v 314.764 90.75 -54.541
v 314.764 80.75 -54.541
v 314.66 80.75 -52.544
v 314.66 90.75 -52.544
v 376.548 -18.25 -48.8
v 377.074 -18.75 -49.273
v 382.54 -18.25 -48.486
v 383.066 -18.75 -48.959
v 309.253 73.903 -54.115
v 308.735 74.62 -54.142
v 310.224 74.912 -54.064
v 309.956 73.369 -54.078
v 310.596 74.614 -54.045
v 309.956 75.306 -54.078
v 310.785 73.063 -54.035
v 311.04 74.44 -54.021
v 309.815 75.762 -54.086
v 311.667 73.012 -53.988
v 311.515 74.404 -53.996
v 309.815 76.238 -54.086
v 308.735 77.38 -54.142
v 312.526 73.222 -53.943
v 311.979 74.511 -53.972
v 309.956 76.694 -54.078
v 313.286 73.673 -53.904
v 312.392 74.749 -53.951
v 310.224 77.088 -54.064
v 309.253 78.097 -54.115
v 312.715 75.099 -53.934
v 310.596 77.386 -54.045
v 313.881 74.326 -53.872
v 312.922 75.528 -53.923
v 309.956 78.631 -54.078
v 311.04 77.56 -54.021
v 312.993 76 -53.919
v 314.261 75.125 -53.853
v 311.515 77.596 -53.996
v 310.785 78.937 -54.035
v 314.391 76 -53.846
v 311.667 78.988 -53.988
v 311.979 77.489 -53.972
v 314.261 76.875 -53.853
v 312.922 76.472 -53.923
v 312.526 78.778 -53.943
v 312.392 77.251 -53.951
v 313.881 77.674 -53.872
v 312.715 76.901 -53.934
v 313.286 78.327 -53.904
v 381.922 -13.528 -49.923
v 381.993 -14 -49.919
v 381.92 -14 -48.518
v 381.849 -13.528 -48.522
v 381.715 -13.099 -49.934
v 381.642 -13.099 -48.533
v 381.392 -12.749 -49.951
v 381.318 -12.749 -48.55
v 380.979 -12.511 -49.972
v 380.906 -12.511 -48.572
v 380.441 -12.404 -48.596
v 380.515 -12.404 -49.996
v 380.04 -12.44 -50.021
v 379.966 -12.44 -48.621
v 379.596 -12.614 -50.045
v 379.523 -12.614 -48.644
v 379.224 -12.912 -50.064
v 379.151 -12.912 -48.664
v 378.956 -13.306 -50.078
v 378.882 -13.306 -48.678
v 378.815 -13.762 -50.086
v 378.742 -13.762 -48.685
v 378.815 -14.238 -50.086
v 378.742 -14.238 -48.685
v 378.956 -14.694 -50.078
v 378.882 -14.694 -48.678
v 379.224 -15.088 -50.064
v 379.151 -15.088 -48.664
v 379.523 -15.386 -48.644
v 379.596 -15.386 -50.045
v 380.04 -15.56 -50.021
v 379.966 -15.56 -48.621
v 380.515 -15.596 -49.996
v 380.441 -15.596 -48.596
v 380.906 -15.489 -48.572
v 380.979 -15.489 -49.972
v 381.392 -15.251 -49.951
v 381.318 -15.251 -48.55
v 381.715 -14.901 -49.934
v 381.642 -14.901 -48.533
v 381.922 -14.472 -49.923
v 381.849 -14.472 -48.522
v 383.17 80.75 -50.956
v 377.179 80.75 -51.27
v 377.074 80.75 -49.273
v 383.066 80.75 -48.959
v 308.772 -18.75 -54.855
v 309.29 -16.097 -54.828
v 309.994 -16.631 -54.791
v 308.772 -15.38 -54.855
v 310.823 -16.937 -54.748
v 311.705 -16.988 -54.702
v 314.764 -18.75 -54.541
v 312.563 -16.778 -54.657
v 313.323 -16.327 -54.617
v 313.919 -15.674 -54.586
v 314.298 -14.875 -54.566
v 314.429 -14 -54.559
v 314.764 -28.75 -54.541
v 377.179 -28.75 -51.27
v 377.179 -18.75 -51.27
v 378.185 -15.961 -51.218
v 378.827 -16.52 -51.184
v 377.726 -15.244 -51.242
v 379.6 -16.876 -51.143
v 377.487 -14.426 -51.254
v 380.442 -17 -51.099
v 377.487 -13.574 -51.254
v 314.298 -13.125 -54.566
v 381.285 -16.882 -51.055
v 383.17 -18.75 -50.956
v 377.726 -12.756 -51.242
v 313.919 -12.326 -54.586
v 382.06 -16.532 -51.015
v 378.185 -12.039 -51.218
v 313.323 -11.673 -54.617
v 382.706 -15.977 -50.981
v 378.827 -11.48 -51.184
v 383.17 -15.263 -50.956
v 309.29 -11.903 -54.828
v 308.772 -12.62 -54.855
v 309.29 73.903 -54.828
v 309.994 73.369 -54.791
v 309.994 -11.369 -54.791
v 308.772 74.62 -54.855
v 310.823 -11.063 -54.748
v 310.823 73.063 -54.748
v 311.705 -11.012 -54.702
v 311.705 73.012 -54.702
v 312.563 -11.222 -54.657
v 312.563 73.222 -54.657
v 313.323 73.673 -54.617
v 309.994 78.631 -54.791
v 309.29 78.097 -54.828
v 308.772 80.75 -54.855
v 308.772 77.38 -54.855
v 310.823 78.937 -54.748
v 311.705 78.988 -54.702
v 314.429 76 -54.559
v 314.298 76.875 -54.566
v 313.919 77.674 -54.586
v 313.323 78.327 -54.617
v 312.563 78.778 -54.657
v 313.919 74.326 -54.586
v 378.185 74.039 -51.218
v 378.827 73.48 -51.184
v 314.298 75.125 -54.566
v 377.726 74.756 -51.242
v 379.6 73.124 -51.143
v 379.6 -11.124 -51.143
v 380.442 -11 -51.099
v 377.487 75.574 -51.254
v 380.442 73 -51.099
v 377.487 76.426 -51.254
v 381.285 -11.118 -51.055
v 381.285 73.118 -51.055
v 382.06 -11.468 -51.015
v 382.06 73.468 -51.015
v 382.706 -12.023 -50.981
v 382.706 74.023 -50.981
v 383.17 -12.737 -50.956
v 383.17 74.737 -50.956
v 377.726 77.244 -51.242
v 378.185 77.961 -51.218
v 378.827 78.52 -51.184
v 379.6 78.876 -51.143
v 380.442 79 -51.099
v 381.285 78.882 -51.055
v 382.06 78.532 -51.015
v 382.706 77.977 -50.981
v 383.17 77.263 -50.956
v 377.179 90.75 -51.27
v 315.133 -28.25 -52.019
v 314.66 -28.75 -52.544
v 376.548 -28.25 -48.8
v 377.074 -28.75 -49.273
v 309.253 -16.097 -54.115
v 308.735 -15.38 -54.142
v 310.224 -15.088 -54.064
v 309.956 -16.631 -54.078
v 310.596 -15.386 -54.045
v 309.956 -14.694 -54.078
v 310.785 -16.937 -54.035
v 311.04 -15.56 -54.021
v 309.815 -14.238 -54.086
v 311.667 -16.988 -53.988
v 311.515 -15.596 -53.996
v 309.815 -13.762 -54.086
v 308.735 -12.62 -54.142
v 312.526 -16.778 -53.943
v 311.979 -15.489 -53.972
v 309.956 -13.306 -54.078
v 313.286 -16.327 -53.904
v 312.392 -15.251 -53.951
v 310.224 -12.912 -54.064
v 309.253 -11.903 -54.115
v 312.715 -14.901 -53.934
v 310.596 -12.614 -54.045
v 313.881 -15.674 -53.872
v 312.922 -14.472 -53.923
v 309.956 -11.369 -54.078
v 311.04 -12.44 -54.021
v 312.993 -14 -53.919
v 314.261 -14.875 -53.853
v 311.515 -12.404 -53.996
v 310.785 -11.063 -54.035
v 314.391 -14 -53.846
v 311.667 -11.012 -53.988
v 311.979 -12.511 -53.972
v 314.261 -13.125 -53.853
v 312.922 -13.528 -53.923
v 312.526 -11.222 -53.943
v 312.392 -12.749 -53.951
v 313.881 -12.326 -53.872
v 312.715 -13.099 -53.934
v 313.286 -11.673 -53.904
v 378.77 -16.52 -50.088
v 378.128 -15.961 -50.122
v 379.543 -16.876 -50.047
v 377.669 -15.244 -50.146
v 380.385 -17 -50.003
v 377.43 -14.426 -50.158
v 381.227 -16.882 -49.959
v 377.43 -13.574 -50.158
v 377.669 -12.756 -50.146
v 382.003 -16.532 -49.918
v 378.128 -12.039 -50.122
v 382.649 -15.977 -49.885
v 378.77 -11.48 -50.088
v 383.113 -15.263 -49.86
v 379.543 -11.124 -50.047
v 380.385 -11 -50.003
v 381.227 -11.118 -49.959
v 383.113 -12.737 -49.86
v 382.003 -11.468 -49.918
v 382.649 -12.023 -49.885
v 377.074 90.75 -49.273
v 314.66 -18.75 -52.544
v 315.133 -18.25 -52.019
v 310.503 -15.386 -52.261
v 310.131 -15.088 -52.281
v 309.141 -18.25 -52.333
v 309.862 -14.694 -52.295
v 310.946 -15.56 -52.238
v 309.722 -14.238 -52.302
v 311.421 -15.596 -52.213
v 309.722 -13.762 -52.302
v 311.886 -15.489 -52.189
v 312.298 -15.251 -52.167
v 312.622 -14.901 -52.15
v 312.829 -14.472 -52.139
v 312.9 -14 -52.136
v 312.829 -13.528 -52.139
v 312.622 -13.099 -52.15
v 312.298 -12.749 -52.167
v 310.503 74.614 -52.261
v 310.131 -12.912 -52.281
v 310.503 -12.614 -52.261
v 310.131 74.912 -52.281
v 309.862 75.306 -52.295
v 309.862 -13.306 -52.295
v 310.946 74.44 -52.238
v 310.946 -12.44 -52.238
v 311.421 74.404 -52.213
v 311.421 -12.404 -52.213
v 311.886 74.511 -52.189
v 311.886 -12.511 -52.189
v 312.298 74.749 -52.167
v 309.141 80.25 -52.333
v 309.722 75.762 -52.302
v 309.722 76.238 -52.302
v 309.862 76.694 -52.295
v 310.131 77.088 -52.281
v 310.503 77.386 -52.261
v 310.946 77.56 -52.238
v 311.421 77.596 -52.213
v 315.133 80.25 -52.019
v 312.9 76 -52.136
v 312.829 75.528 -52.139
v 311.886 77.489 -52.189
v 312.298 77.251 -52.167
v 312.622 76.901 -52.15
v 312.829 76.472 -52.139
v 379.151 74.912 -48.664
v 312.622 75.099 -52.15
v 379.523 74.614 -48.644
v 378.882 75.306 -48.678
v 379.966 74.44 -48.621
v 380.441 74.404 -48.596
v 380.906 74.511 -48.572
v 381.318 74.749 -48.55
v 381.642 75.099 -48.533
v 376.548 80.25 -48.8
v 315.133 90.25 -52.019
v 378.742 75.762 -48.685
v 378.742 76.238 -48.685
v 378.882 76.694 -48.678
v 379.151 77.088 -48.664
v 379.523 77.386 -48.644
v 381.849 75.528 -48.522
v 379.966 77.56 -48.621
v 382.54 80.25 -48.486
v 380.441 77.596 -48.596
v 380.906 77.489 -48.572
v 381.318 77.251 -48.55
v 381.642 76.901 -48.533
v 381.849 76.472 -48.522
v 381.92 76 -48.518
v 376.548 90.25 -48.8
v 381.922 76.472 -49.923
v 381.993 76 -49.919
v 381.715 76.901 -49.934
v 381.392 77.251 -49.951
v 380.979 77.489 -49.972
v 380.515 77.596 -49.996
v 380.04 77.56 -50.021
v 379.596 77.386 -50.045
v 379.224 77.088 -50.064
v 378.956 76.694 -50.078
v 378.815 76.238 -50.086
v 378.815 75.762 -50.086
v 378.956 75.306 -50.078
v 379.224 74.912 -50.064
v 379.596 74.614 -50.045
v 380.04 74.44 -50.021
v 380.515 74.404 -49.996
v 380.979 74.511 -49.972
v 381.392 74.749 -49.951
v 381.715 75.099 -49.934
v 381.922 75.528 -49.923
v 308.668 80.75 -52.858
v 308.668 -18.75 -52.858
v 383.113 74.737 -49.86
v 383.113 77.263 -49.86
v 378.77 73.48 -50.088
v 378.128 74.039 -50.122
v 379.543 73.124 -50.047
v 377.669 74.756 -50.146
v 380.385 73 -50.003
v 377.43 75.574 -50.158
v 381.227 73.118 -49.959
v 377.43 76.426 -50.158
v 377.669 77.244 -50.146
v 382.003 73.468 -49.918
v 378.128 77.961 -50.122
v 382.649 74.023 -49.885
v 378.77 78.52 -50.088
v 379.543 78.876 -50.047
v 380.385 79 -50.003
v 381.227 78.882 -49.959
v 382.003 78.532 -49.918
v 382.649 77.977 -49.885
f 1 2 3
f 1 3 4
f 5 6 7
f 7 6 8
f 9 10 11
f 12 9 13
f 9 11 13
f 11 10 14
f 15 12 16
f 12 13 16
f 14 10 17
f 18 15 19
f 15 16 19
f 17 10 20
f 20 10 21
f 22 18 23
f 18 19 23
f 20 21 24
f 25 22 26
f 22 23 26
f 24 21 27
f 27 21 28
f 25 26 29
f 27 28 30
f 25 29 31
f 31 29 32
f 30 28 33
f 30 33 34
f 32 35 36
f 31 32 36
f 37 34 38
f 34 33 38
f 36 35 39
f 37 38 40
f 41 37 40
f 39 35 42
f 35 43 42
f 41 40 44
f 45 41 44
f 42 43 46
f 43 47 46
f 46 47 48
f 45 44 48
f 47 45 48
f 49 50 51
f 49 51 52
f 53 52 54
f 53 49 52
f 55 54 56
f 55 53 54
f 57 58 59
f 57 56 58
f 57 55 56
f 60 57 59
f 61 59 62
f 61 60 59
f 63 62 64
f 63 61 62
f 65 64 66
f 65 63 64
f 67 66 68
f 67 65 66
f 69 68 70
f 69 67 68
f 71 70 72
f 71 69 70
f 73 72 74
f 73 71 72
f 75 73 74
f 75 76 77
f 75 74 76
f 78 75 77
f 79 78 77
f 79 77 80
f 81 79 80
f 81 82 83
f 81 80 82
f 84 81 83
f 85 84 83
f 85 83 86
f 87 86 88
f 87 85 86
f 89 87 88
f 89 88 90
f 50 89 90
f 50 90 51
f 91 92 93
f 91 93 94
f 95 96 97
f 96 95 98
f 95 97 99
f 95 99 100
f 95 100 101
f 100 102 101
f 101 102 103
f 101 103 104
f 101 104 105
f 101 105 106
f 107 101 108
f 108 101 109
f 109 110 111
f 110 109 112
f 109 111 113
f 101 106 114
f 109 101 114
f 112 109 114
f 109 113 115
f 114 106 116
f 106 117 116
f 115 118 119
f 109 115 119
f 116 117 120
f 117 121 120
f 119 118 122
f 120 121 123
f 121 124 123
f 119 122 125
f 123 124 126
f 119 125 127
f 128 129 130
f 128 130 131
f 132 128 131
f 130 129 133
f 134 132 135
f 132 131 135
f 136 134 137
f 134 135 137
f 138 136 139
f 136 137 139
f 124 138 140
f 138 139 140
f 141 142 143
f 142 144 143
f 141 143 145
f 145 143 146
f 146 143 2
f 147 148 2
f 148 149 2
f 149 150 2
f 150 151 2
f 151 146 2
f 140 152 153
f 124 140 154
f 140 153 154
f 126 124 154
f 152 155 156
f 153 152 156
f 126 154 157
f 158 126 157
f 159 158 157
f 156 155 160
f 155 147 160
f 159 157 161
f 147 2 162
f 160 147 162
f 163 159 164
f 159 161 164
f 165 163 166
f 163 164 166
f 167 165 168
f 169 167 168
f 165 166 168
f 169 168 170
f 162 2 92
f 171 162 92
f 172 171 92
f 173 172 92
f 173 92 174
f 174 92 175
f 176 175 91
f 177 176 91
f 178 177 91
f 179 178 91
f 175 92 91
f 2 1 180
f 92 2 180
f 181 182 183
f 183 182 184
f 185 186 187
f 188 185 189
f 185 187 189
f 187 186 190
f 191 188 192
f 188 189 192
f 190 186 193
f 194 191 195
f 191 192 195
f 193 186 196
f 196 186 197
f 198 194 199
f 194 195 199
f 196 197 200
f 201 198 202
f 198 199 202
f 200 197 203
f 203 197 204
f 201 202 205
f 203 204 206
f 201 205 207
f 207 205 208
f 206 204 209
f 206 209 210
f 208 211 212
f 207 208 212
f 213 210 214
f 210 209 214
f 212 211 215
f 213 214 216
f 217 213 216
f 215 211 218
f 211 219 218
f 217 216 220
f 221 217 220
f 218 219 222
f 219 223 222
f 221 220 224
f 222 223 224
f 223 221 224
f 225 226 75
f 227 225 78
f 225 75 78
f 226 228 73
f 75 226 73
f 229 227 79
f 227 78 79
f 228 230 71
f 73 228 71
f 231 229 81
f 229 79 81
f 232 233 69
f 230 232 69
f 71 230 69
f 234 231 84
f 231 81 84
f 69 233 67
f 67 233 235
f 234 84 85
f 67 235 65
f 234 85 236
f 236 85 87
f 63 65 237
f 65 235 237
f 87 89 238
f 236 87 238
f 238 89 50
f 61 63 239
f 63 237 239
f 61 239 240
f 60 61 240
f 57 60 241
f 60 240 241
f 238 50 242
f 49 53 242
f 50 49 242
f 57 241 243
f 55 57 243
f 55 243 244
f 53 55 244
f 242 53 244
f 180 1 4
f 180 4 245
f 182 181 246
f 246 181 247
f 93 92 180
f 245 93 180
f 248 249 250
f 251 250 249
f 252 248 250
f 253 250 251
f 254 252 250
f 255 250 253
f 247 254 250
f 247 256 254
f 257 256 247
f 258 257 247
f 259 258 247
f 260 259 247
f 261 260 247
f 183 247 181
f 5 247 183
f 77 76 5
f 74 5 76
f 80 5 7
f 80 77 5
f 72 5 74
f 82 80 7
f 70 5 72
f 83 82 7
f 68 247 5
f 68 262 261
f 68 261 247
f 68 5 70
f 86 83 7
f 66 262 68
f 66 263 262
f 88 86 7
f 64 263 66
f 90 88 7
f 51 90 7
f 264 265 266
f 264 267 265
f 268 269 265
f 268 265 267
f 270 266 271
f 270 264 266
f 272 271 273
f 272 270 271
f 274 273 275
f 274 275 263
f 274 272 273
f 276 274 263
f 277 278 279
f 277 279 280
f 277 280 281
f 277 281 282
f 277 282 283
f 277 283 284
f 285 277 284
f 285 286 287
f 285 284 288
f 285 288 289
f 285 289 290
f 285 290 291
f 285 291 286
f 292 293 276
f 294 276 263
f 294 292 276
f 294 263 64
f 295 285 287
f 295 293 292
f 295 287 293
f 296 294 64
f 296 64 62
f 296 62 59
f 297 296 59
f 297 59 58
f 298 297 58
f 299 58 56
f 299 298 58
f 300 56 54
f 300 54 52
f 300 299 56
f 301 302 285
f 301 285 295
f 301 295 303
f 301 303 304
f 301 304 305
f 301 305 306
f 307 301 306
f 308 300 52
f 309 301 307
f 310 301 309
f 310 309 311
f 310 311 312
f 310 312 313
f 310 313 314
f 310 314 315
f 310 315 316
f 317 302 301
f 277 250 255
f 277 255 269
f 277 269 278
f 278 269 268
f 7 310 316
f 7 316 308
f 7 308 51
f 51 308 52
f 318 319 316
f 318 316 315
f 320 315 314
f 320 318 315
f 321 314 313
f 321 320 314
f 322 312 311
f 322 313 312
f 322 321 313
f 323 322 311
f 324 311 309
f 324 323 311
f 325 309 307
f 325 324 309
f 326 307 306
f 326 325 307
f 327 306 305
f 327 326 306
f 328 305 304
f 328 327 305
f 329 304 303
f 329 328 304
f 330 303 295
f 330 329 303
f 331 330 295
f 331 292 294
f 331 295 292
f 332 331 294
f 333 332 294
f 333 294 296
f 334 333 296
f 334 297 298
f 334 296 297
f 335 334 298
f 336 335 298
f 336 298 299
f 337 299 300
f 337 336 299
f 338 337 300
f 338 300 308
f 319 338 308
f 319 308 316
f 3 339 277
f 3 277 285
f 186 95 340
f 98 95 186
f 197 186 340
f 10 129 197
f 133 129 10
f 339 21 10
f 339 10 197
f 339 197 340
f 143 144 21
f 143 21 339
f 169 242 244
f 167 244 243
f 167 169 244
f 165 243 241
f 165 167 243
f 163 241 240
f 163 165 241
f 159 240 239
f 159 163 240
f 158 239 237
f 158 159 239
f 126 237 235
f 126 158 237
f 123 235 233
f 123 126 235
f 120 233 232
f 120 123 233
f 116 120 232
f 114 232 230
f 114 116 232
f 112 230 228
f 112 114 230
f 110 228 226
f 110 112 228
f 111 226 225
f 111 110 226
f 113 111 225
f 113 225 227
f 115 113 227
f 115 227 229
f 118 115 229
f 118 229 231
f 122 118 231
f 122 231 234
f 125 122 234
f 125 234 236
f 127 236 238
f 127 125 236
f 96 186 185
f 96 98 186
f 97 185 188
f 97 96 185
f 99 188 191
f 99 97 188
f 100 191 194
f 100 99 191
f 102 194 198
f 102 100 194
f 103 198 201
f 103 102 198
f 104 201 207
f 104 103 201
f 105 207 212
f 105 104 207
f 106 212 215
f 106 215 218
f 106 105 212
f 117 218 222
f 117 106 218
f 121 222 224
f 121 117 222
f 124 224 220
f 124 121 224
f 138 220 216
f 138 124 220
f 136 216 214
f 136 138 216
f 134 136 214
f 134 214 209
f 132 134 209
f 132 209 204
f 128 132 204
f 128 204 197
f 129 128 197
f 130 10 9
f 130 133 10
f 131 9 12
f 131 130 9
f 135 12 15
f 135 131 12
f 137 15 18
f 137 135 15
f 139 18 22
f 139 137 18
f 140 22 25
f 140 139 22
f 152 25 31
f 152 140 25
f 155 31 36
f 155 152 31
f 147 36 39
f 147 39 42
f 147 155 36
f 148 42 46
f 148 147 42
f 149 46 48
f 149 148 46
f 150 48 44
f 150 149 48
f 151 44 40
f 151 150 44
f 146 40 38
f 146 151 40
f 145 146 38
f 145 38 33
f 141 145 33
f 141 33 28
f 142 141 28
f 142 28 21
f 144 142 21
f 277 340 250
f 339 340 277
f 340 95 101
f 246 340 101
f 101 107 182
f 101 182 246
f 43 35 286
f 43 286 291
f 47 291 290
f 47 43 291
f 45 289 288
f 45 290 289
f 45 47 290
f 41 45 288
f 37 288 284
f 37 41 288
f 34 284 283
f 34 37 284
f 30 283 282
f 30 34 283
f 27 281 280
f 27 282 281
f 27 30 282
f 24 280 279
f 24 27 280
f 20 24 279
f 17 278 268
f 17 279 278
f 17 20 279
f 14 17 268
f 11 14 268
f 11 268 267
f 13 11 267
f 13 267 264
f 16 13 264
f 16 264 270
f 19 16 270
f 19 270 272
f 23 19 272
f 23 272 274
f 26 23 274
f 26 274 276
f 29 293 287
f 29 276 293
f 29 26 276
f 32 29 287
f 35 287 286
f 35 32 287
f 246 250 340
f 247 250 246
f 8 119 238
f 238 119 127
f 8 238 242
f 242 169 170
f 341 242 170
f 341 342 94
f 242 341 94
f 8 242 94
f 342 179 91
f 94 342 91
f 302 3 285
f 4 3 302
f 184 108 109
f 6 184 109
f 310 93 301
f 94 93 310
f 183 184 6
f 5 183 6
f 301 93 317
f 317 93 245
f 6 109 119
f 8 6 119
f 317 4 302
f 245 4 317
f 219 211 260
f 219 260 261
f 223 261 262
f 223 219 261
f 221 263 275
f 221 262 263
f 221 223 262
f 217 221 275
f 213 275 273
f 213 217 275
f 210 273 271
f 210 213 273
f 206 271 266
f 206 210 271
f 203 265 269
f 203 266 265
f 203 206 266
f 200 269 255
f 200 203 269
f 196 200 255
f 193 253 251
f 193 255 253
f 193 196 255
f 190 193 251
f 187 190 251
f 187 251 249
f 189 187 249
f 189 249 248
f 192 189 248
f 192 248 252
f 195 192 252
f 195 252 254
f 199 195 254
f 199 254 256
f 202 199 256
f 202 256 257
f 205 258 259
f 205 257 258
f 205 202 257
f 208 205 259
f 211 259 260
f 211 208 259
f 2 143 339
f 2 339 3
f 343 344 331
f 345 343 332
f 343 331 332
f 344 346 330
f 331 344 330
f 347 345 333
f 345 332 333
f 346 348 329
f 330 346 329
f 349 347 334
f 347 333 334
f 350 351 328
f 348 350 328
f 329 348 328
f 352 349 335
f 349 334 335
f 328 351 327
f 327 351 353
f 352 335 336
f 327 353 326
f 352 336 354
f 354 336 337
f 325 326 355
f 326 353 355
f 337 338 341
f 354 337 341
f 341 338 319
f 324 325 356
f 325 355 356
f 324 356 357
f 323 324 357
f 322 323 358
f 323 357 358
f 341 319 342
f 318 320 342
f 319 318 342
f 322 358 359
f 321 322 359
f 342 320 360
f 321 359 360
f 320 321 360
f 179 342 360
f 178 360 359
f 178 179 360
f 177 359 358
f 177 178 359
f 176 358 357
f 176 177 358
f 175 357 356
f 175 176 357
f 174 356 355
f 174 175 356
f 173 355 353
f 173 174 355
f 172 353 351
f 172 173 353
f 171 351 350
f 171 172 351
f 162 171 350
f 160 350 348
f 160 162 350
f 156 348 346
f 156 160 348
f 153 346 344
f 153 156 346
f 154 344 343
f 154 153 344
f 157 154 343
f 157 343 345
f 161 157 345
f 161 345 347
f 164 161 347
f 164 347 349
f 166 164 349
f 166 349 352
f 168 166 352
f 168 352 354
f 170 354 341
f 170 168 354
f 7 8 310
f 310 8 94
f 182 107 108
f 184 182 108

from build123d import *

# Parameters (mm, degrees)
CYLINDER425_R               = 1.6
CYLINDER425_DEPTH           = 15
CYLINDER425_PLACEMENT_ANGLE = 3
CYLINDER428_R               = 1.6
CYLINDER428_DEPTH           = 15
CYLINDER428_PLACEMENT_ANGLE = 3
CYLINDER426_R               = 1.6
CYLINDER426_DEPTH           = 15
CYLINDER426_PLACEMENT_ANGLE = 3
CYLINDER427_R               = 1.6
CYLINDER427_DEPTH           = 15
CYLINDER427_PLACEMENT_ANGLE = 3
CYLINDER422_R               = 3
CYLINDER422_DEPTH           = 2
CYLINDER422_PLACEMENT_ANGLE = 3
CYLINDER423_R               = 3
CYLINDER423_DEPTH           = 2
CYLINDER423_PLACEMENT_ANGLE = 3
CYLINDER424_R               = 3
CYLINDER424_DEPTH           = 2
CYLINDER424_PLACEMENT_ANGLE = 3
CYLINDER421_R               = 3
CYLINDER421_DEPTH           = 2
CYLINDER421_PLACEMENT_ANGLE = 3
BOX289_W                    = 62.5
BOX289_H                    = 119.5
BOX289_DEPTH                = 2.5
BOX288_W                    = 74.5
BOX288_H                    = 99.5
BOX288_DEPTH                = 2.5
CHAMFER028_SIZE             = 0.5
CHAMFER028_PLACEMENT_ANGLE  = 3


with BuildPart() as cylinder560:
    # Cylinder425 → Cylinder425 (new body)
    with BuildSketch(Plane.XY):
        Circle(CYLINDER425_R)
    extrude(amount=CYLINDER425_DEPTH)


with BuildPart() as cylinder560_1:
    # Cylinder425 placement: moved
    add(cylinder560.part.moved(Location((380.5, -14, -52))).rotate(Axis((380.5, -14, -52), (0, -1, 0)), CYLINDER425_PLACEMENT_ANGLE))


with BuildPart() as fusion380:
    # Cylinder428 → Cylinder428 (new body)
    with BuildSketch(Plane.XY):
        Circle(CYLINDER428_R)
    extrude(amount=CYLINDER428_DEPTH)


with BuildPart() as fusion380_1:
    # Cylinder428 placement: moved
    add(fusion380.part.moved(Location((311.5, -14, -56))).rotate(Axis((311.5, -14, -56), (0, -1, 0)), CYLINDER428_PLACEMENT_ANGLE))

    # Fusion380: union Cylinder560
    add(cylinder560_1.part)


with BuildPart() as cylinder561:
    # Cylinder426 → Cylinder426 (new body)
    with BuildSketch(Plane.XY):
        Circle(CYLINDER426_R)
    extrude(amount=CYLINDER426_DEPTH)


with BuildPart() as cylinder561_1:
    # Cylinder426 placement: moved
    add(cylinder561.part.moved(Location((380.5, -14, -52))).rotate(Axis((380.5, -14, -52), (0, -1, 0)), CYLINDER426_PLACEMENT_ANGLE))


with BuildPart() as fusion379:
    # Cylinder427 → Cylinder427 (new body)
    with BuildSketch(Plane.XY):
        Circle(CYLINDER427_R)
    extrude(amount=CYLINDER427_DEPTH)


with BuildPart() as fusion379_1:
    # Cylinder427 placement: moved
    add(fusion379.part.moved(Location((311.5, -14, -56))).rotate(Axis((311.5, -14, -56), (0, -1, 0)), CYLINDER427_PLACEMENT_ANGLE))

    # Fusion378: union Cylinder561
    add(cylinder561_1.part)


with BuildPart() as fusion379_2:
    # Fusion378 placement: moved
    add(fusion379_1.part.moved(Location((0, 90, 0))))

    # Fusion379: union Fusion380
    add(fusion380_1.part)


with BuildPart() as cylinder557:
    # Cylinder422 → Cylinder422 (new body)
    with BuildSketch(Plane.XY):
        Circle(CYLINDER422_R)
    extrude(amount=CYLINDER422_DEPTH)


with BuildPart() as cylinder557_1:
    # Cylinder422 placement: moved
    add(cylinder557.part.moved(Location((380.5, -14, -52))).rotate(Axis((380.5, -14, -52), (0, -1, 0)), CYLINDER422_PLACEMENT_ANGLE))


with BuildPart() as fusion376:
    # Cylinder423 → Cylinder423 (new body)
    with BuildSketch(Plane.XY):
        Circle(CYLINDER423_R)
    extrude(amount=CYLINDER423_DEPTH)


with BuildPart() as fusion376_1:
    # Cylinder423 placement: moved
    add(fusion376.part.moved(Location((311.5, -14, -56))).rotate(Axis((311.5, -14, -56), (0, -1, 0)), CYLINDER423_PLACEMENT_ANGLE))

    # Fusion376: union Cylinder557
    add(cylinder557_1.part)


with BuildPart() as cylinder559:
    # Cylinder424 → Cylinder424 (new body)
    with BuildSketch(Plane.XY):
        Circle(CYLINDER424_R)
    extrude(amount=CYLINDER424_DEPTH)


with BuildPart() as cylinder559_1:
    # Cylinder424 placement: moved
    add(cylinder559.part.moved(Location((380.5, -14, -52))).rotate(Axis((380.5, -14, -52), (0, -1, 0)), CYLINDER424_PLACEMENT_ANGLE))


with BuildPart() as fusion381:
    # Cylinder421 → Cylinder421 (new body)
    with BuildSketch(Plane.XY):
        Circle(CYLINDER421_R)
    extrude(amount=CYLINDER421_DEPTH)


with BuildPart() as fusion381_1:
    # Cylinder421 placement: moved
    add(fusion381.part.moved(Location((311.5, -14, -56))).rotate(Axis((311.5, -14, -56), (0, -1, 0)), CYLINDER421_PLACEMENT_ANGLE))

    # Fusion377: union Cylinder559
    add(cylinder559_1.part)


with BuildPart() as fusion381_2:
    # Fusion377 placement: moved
    add(fusion381_1.part.moved(Location((0, 90, 0))))

    # Fusion375: union Fusion376
    add(fusion376_1.part)

    # Fusion381: union Fusion379
    add(fusion379_2.part)


with BuildPart() as cube369:
    # Box289 → Box289 (new body)
    with BuildSketch(Plane(origin=(8.75, -23.75, -0.5), x_dir=(1, 0, 0), z_dir=(0, 0, 1))):
        with Locations((31.25, 59.75)):
            Rectangle(BOX289_W, BOX289_H)
    extrude(amount=BOX289_DEPTH)


with BuildPart() as battery_box_wide_closure:
    # Box288 → Box288 (new body)
    with BuildSketch(Plane(origin=(2.75, -13.75, -0.5), x_dir=(1, 0, 0), z_dir=(0, 0, 1))):
        with Locations((37.25, 49.75)):
            Rectangle(BOX288_W, BOX288_H)
    extrude(amount=BOX288_DEPTH)

    # Fusion371: union Cube369
    add(cube369.part)

    # Chamfer028
    chamfer028_edges = [battery_box_wide_closure.edges().sort_by_distance(p)[0] for p in [
        (2.75, 36, 2),
        (5.75, -13.75, 2),
        (5.75, 85.75, 2),
        (8.75, -18.75, 2),
        (8.75, 90.75, 2),
        (40, -23.75, 2),
        (40, 95.75, 2),
        (71.25, -18.75, 2),
        (71.25, 90.75, 2),
        (74.25, 85.75, 2),
        (77.25, 36, 2),
        (74.25, -13.75, 2),
    ]]
    chamfer(chamfer028_edges, length=CHAMFER028_SIZE)


with BuildPart() as battery_box_wide_closure_1:
    # Chamfer028 placement: moved
    add(battery_box_wide_closure.part.moved(Location((306, -5, -54.5))).rotate(Axis((306, -5, -54.5), (0, -1, 0)), CHAMFER028_PLACEMENT_ANGLE))

    # Cut291: cut Fusion381
    add(fusion381_2.part, mode=Mode.SUBTRACT)


solid = battery_box_wide_closure_1.part
